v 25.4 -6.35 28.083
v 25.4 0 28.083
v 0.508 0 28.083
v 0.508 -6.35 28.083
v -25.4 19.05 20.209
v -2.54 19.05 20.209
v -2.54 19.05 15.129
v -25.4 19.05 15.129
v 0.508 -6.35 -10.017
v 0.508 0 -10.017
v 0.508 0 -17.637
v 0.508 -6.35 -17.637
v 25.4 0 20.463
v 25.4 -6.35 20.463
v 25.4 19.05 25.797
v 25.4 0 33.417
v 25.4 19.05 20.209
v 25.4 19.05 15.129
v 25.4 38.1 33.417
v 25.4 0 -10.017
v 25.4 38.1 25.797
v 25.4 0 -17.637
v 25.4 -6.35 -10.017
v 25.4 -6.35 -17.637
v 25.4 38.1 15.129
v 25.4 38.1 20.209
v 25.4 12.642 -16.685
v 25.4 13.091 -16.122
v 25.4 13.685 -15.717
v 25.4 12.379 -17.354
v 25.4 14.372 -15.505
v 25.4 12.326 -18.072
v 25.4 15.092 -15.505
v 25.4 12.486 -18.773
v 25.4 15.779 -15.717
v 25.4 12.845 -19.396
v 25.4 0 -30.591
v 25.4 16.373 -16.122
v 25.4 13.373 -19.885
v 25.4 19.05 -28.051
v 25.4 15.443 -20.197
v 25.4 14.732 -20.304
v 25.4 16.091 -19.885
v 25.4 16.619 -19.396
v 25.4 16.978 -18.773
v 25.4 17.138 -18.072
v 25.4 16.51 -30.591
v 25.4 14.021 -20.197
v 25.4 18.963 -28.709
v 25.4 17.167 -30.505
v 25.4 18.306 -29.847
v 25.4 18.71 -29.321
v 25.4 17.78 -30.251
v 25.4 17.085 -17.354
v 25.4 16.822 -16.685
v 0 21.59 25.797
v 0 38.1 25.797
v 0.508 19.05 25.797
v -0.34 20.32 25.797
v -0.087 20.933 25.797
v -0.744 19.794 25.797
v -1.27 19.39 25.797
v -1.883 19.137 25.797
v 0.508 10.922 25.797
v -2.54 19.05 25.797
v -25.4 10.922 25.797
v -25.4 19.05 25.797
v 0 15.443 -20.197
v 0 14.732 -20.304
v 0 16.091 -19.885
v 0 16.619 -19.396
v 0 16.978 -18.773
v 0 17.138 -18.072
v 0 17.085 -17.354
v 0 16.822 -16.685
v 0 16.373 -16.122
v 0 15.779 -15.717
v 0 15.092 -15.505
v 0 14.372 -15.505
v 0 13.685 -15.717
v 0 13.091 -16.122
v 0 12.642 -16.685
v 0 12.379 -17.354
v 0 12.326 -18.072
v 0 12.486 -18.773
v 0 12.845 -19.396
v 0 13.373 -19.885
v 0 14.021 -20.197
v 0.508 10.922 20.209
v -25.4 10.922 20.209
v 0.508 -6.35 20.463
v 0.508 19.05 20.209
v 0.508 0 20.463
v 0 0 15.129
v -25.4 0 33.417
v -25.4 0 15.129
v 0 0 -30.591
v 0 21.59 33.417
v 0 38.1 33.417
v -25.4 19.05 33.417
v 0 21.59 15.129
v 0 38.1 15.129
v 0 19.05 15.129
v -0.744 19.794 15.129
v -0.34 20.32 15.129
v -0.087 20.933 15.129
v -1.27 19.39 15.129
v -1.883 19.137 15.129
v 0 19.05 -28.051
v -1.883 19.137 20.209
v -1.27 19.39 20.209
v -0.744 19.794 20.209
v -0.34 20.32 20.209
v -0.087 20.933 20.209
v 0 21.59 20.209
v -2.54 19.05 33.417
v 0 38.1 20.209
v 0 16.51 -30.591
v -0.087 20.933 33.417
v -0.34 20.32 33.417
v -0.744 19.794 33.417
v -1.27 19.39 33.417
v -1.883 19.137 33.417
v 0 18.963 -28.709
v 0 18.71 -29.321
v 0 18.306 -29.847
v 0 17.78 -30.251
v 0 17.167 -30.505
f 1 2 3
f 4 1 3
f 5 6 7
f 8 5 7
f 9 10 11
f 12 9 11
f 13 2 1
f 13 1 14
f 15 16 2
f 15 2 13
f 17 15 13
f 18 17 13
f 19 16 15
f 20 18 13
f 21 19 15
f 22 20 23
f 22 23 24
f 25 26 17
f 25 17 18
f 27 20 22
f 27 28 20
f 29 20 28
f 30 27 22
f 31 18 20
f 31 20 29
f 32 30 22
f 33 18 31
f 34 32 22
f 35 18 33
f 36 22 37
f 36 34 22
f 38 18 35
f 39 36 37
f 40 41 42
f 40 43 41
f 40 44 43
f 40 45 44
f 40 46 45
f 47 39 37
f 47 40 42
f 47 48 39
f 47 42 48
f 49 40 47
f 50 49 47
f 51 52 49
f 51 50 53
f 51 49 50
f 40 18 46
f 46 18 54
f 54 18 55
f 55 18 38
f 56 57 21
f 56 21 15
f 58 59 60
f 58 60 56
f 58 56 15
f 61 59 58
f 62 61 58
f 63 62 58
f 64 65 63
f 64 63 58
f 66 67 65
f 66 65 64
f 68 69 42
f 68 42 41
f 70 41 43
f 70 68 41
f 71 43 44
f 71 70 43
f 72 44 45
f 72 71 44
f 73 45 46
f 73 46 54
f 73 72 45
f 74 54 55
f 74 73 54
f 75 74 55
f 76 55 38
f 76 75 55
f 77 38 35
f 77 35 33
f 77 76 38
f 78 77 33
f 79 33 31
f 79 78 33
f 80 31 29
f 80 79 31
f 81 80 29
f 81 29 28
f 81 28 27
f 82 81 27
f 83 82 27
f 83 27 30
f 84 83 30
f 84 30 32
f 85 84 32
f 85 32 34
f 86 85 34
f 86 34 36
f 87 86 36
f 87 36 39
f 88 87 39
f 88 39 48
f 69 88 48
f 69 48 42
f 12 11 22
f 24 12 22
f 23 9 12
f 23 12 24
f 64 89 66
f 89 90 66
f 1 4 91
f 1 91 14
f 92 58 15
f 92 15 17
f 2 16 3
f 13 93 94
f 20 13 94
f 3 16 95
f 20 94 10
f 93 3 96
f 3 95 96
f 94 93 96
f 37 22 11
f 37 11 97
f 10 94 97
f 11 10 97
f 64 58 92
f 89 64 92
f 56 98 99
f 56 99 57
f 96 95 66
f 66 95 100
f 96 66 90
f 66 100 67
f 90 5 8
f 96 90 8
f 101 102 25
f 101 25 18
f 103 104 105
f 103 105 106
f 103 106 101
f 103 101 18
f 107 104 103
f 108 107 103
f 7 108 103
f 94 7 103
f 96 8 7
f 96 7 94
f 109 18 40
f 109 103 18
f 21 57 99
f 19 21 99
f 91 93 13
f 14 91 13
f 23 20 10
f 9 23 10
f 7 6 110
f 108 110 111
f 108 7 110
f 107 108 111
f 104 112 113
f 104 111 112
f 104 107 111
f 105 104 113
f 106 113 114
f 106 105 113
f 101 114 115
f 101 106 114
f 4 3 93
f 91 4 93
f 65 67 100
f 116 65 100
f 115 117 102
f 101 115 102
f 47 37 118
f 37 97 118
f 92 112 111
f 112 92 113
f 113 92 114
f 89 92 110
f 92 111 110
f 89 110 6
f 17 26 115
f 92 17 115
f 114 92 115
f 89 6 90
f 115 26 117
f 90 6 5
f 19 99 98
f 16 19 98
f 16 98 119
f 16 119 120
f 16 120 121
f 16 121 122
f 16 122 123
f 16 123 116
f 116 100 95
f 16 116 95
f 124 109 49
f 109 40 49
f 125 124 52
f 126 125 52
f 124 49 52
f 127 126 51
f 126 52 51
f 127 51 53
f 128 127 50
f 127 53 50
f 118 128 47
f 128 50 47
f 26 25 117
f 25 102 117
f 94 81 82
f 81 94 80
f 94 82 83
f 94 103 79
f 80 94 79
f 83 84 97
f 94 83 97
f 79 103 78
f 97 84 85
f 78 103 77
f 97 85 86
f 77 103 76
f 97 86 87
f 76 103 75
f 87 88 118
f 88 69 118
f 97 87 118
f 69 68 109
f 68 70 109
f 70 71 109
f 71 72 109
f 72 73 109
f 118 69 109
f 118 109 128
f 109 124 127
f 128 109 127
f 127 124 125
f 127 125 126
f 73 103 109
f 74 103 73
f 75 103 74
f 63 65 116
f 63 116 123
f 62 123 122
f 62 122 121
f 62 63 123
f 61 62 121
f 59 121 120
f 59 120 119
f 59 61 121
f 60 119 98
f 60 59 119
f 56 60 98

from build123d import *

# Parameters (mm, degrees)
SKETCH1_W           = 5.08
SKETCH1_H           = 8.128
BOSS_EXTRUDE1_DEPTH = 25.4
SKETCH2_W           = 5.08
SKETCH2_H           = 19.05
SKETCH2_W_2         = 7.62
SKETCH2_W_3         = 45.72
SKETCH2_R           = 2.413
BOSS_EXTRUDE2_DEPTH = 0.508
SKETCH2_3_W         = 45.72
SKETCH2_3_H         = 19.05
SKETCH2_3_R         = 2.413
BOSS_EXTRUDE3_DEPTH = 25.4
SKETCH3_W           = 5.588
SKETCH3_H           = 8.128
BOSS_EXTRUDE6_DEPTH = 24.892
FILLET1_R           = 2.54
FILLET2_R           = 2.54
BOSS_EXTRUDE7_DEPTH = 6.35


with BuildPart() as part:
    # Sketch1 → Boss-Extrude1 (new body)
    with BuildSketch(Plane(origin=(0, 0, 0), x_dir=(0, 0, -1), z_dir=(1, 0, 0))):
        Polygon((-33.416737041, 19.05), (-33.416737041, 0), (-15.128737041, 0), (-15.128737041, 10.922), (-20.208737041, 10.922), (-25.796737041, 10.922), (-25.796737041, 19.05), align=None)
        with Locations((-17.668737041, 14.986)):
            Rectangle(SKETCH1_W, SKETCH1_H)
    extrude(amount=-BOSS_EXTRUDE1_DEPTH)

    # Sketch2 → Boss-Extrude2 (add)
    # profile 1 of 4: a face of its own
    with BuildSketch(Plane(origin=(0, 0, 0), x_dir=(0, 0, -1), z_dir=(1, 0, 0))):
        Polygon((-33.416737041, 0), (-15.128737041, 0), (-15.128737041, 19.05), (-20.208737041, 19.05), (-20.208737041, 10.922), (-25.796737041, 10.922), (-25.796737041, 19.05), (-33.416737041, 19.05), align=None)
    # profile 2 of 4: a face of its own
    with BuildSketch(Plane(origin=(0, 0, 0), x_dir=(0, 0, -1), z_dir=(1, 0, 0))):
        with Locations((-17.668737041, 28.575)):
            Rectangle(SKETCH2_W, SKETCH2_H)
    # profile 3 of 4: a face of its own
    with BuildSketch(Plane(origin=(0, 0, 0), x_dir=(0, 0, -1), z_dir=(1, 0, 0))):
        with Locations((-29.606737041, 28.575)):
            Rectangle(SKETCH2_W_2, SKETCH2_H)
    # profile 4 of 4: a face of its own
    with BuildSketch(Plane(origin=(0, 0, 0), x_dir=(0, 0, -1), z_dir=(1, 0, 0))):
        with Locations((7.731262959, 9.525)):
            Rectangle(SKETCH2_W_3, SKETCH2_H)
        with Locations((17.891262959, 14.732)):
            Circle(SKETCH2_R, mode=Mode.SUBTRACT)
    extrude(amount=BOSS_EXTRUDE2_DEPTH)

    # Sketch2<3> → Boss-Extrude3 (add)
    with BuildSketch(Plane(origin=(0, 0, 0), x_dir=(0, 0, -1), z_dir=(1, 0, 0))):
        with Locations((7.731262959, 9.525)):
            Rectangle(SKETCH2_3_W, SKETCH2_3_H)
        with Locations((17.891262959, 14.732)):
            Circle(SKETCH2_3_R, mode=Mode.SUBTRACT)
    extrude(amount=BOSS_EXTRUDE3_DEPTH)

    # Sketch3 → Boss-Extrude6 (add)
    with BuildSketch(Plane(origin=(0.508, 0, 0), x_dir=(0, 0, -1), z_dir=(1, 0, 0))):
        Polygon((-33.416737041, 0), (-15.128737041, 0), (-15.128737041, 19.05), (-15.128737041, 38.1), (-20.208737041, 38.1), (-20.208737041, 10.922), (-25.796737041, 10.922), (-25.796737041, 38.1), (-33.416737041, 38.1), align=None)
        with Locations((-23.002737041, 14.986)):
            Rectangle(SKETCH3_W, SKETCH3_H)
    extrude(amount=BOSS_EXTRUDE6_DEPTH)

    # Fillet1
    # the kernel refuses this fillet: 2.54 mm, written as the material it adds along each edge
    with BuildSketch(Plane(origin=(0, 19.05, 19.446737041), x_dir=(0, 1, 0), z_dir=(0, 0, 1))) as fillet1_piece_1_section:
        with BuildLine():
            CenterArc((FILLET1_R, FILLET1_R), FILLET1_R, 180, 90)
            Line((0, FILLET1_R), (0, 0))
            Line((0, 0), (FILLET1_R, 0))
        make_face()
    fillet1_piece_1 = extrude(amount=13.97, mode=Mode.PRIVATE)
    fillet1_piece_1 = split(fillet1_piece_1, bisect_by=Plane(origin=(-0.57504359, 19.62504359, 20.208737041), z_dir=(0, 0, -1)), keep=Keep.TOP, mode=Mode.PRIVATE)
    add(fillet1_piece_1)
    with BuildSketch(Plane(origin=(0, 19.05, 25.796737041), x_dir=(0, 1, 0), z_dir=(0, 0, 1))) as fillet1_piece_2:
        with BuildLine():
            CenterArc((FILLET1_R, FILLET1_R), FILLET1_R, 180, 90)
            Line((0, FILLET1_R), (0, 0))
            Line((0, 0), (FILLET1_R, 0))
        make_face()
    extrude(amount=7.62)
    with BuildSketch(Plane(origin=(0, 19.05, 15.128737041), x_dir=(0, 1, 0), z_dir=(0, 0, 1))) as fillet1_piece_3:
        with BuildLine():
            CenterArc((FILLET1_R, FILLET1_R), FILLET1_R, 180, 90)
            Line((0, FILLET1_R), (0, 0))
            Line((0, 0), (FILLET1_R, 0))
        make_face()
    extrude(amount=5.08)
    with BuildSketch(Plane(origin=(0, 19.05, 15.128737041), x_dir=(0, 1, 0), z_dir=(0, 0, 1))) as fillet1_piece_4_section:
        with BuildLine():
            CenterArc((FILLET1_R, FILLET1_R), FILLET1_R, 180, 90)
            Line((0, FILLET1_R), (0, 0))
            Line((0, 0), (FILLET1_R, 0))
        make_face()
    fillet1_piece_4 = extrude(amount=11.43, mode=Mode.PRIVATE)
    fillet1_piece_4 = split(fillet1_piece_4, bisect_by=Plane(origin=(-0.57504359, 19.62504359, 25.796737041), z_dir=(0, 0, 1)), keep=Keep.TOP, mode=Mode.PRIVATE)
    add(fillet1_piece_4)

    # Fillet2
    fillet2_edges = [part.edges().sort_by_distance(p)[0] for p in [
        (12.7, 19.05, -30.591262959),
    ]]
    fillet(fillet2_edges, radius=FILLET2_R)

    # Sketch4 → Boss-Extrude7 (add)
    with BuildSketch(Plane.XZ):
        Polygon((0.508, 28.082737041), (0.508, 24.272737041), (0.508, 20.462737041), (25.4, 20.462737041), (25.4, 24.272737041), (25.4, 28.082737041), align=None)
        Polygon((25.4, -13.827262959), (25.4, -10.017262959), (0.508, -10.017262959), (0.508, -17.637262959), (25.4, -17.637262959), align=None)
    extrude(amount=BOSS_EXTRUDE7_DEPTH)


solid = part.part
